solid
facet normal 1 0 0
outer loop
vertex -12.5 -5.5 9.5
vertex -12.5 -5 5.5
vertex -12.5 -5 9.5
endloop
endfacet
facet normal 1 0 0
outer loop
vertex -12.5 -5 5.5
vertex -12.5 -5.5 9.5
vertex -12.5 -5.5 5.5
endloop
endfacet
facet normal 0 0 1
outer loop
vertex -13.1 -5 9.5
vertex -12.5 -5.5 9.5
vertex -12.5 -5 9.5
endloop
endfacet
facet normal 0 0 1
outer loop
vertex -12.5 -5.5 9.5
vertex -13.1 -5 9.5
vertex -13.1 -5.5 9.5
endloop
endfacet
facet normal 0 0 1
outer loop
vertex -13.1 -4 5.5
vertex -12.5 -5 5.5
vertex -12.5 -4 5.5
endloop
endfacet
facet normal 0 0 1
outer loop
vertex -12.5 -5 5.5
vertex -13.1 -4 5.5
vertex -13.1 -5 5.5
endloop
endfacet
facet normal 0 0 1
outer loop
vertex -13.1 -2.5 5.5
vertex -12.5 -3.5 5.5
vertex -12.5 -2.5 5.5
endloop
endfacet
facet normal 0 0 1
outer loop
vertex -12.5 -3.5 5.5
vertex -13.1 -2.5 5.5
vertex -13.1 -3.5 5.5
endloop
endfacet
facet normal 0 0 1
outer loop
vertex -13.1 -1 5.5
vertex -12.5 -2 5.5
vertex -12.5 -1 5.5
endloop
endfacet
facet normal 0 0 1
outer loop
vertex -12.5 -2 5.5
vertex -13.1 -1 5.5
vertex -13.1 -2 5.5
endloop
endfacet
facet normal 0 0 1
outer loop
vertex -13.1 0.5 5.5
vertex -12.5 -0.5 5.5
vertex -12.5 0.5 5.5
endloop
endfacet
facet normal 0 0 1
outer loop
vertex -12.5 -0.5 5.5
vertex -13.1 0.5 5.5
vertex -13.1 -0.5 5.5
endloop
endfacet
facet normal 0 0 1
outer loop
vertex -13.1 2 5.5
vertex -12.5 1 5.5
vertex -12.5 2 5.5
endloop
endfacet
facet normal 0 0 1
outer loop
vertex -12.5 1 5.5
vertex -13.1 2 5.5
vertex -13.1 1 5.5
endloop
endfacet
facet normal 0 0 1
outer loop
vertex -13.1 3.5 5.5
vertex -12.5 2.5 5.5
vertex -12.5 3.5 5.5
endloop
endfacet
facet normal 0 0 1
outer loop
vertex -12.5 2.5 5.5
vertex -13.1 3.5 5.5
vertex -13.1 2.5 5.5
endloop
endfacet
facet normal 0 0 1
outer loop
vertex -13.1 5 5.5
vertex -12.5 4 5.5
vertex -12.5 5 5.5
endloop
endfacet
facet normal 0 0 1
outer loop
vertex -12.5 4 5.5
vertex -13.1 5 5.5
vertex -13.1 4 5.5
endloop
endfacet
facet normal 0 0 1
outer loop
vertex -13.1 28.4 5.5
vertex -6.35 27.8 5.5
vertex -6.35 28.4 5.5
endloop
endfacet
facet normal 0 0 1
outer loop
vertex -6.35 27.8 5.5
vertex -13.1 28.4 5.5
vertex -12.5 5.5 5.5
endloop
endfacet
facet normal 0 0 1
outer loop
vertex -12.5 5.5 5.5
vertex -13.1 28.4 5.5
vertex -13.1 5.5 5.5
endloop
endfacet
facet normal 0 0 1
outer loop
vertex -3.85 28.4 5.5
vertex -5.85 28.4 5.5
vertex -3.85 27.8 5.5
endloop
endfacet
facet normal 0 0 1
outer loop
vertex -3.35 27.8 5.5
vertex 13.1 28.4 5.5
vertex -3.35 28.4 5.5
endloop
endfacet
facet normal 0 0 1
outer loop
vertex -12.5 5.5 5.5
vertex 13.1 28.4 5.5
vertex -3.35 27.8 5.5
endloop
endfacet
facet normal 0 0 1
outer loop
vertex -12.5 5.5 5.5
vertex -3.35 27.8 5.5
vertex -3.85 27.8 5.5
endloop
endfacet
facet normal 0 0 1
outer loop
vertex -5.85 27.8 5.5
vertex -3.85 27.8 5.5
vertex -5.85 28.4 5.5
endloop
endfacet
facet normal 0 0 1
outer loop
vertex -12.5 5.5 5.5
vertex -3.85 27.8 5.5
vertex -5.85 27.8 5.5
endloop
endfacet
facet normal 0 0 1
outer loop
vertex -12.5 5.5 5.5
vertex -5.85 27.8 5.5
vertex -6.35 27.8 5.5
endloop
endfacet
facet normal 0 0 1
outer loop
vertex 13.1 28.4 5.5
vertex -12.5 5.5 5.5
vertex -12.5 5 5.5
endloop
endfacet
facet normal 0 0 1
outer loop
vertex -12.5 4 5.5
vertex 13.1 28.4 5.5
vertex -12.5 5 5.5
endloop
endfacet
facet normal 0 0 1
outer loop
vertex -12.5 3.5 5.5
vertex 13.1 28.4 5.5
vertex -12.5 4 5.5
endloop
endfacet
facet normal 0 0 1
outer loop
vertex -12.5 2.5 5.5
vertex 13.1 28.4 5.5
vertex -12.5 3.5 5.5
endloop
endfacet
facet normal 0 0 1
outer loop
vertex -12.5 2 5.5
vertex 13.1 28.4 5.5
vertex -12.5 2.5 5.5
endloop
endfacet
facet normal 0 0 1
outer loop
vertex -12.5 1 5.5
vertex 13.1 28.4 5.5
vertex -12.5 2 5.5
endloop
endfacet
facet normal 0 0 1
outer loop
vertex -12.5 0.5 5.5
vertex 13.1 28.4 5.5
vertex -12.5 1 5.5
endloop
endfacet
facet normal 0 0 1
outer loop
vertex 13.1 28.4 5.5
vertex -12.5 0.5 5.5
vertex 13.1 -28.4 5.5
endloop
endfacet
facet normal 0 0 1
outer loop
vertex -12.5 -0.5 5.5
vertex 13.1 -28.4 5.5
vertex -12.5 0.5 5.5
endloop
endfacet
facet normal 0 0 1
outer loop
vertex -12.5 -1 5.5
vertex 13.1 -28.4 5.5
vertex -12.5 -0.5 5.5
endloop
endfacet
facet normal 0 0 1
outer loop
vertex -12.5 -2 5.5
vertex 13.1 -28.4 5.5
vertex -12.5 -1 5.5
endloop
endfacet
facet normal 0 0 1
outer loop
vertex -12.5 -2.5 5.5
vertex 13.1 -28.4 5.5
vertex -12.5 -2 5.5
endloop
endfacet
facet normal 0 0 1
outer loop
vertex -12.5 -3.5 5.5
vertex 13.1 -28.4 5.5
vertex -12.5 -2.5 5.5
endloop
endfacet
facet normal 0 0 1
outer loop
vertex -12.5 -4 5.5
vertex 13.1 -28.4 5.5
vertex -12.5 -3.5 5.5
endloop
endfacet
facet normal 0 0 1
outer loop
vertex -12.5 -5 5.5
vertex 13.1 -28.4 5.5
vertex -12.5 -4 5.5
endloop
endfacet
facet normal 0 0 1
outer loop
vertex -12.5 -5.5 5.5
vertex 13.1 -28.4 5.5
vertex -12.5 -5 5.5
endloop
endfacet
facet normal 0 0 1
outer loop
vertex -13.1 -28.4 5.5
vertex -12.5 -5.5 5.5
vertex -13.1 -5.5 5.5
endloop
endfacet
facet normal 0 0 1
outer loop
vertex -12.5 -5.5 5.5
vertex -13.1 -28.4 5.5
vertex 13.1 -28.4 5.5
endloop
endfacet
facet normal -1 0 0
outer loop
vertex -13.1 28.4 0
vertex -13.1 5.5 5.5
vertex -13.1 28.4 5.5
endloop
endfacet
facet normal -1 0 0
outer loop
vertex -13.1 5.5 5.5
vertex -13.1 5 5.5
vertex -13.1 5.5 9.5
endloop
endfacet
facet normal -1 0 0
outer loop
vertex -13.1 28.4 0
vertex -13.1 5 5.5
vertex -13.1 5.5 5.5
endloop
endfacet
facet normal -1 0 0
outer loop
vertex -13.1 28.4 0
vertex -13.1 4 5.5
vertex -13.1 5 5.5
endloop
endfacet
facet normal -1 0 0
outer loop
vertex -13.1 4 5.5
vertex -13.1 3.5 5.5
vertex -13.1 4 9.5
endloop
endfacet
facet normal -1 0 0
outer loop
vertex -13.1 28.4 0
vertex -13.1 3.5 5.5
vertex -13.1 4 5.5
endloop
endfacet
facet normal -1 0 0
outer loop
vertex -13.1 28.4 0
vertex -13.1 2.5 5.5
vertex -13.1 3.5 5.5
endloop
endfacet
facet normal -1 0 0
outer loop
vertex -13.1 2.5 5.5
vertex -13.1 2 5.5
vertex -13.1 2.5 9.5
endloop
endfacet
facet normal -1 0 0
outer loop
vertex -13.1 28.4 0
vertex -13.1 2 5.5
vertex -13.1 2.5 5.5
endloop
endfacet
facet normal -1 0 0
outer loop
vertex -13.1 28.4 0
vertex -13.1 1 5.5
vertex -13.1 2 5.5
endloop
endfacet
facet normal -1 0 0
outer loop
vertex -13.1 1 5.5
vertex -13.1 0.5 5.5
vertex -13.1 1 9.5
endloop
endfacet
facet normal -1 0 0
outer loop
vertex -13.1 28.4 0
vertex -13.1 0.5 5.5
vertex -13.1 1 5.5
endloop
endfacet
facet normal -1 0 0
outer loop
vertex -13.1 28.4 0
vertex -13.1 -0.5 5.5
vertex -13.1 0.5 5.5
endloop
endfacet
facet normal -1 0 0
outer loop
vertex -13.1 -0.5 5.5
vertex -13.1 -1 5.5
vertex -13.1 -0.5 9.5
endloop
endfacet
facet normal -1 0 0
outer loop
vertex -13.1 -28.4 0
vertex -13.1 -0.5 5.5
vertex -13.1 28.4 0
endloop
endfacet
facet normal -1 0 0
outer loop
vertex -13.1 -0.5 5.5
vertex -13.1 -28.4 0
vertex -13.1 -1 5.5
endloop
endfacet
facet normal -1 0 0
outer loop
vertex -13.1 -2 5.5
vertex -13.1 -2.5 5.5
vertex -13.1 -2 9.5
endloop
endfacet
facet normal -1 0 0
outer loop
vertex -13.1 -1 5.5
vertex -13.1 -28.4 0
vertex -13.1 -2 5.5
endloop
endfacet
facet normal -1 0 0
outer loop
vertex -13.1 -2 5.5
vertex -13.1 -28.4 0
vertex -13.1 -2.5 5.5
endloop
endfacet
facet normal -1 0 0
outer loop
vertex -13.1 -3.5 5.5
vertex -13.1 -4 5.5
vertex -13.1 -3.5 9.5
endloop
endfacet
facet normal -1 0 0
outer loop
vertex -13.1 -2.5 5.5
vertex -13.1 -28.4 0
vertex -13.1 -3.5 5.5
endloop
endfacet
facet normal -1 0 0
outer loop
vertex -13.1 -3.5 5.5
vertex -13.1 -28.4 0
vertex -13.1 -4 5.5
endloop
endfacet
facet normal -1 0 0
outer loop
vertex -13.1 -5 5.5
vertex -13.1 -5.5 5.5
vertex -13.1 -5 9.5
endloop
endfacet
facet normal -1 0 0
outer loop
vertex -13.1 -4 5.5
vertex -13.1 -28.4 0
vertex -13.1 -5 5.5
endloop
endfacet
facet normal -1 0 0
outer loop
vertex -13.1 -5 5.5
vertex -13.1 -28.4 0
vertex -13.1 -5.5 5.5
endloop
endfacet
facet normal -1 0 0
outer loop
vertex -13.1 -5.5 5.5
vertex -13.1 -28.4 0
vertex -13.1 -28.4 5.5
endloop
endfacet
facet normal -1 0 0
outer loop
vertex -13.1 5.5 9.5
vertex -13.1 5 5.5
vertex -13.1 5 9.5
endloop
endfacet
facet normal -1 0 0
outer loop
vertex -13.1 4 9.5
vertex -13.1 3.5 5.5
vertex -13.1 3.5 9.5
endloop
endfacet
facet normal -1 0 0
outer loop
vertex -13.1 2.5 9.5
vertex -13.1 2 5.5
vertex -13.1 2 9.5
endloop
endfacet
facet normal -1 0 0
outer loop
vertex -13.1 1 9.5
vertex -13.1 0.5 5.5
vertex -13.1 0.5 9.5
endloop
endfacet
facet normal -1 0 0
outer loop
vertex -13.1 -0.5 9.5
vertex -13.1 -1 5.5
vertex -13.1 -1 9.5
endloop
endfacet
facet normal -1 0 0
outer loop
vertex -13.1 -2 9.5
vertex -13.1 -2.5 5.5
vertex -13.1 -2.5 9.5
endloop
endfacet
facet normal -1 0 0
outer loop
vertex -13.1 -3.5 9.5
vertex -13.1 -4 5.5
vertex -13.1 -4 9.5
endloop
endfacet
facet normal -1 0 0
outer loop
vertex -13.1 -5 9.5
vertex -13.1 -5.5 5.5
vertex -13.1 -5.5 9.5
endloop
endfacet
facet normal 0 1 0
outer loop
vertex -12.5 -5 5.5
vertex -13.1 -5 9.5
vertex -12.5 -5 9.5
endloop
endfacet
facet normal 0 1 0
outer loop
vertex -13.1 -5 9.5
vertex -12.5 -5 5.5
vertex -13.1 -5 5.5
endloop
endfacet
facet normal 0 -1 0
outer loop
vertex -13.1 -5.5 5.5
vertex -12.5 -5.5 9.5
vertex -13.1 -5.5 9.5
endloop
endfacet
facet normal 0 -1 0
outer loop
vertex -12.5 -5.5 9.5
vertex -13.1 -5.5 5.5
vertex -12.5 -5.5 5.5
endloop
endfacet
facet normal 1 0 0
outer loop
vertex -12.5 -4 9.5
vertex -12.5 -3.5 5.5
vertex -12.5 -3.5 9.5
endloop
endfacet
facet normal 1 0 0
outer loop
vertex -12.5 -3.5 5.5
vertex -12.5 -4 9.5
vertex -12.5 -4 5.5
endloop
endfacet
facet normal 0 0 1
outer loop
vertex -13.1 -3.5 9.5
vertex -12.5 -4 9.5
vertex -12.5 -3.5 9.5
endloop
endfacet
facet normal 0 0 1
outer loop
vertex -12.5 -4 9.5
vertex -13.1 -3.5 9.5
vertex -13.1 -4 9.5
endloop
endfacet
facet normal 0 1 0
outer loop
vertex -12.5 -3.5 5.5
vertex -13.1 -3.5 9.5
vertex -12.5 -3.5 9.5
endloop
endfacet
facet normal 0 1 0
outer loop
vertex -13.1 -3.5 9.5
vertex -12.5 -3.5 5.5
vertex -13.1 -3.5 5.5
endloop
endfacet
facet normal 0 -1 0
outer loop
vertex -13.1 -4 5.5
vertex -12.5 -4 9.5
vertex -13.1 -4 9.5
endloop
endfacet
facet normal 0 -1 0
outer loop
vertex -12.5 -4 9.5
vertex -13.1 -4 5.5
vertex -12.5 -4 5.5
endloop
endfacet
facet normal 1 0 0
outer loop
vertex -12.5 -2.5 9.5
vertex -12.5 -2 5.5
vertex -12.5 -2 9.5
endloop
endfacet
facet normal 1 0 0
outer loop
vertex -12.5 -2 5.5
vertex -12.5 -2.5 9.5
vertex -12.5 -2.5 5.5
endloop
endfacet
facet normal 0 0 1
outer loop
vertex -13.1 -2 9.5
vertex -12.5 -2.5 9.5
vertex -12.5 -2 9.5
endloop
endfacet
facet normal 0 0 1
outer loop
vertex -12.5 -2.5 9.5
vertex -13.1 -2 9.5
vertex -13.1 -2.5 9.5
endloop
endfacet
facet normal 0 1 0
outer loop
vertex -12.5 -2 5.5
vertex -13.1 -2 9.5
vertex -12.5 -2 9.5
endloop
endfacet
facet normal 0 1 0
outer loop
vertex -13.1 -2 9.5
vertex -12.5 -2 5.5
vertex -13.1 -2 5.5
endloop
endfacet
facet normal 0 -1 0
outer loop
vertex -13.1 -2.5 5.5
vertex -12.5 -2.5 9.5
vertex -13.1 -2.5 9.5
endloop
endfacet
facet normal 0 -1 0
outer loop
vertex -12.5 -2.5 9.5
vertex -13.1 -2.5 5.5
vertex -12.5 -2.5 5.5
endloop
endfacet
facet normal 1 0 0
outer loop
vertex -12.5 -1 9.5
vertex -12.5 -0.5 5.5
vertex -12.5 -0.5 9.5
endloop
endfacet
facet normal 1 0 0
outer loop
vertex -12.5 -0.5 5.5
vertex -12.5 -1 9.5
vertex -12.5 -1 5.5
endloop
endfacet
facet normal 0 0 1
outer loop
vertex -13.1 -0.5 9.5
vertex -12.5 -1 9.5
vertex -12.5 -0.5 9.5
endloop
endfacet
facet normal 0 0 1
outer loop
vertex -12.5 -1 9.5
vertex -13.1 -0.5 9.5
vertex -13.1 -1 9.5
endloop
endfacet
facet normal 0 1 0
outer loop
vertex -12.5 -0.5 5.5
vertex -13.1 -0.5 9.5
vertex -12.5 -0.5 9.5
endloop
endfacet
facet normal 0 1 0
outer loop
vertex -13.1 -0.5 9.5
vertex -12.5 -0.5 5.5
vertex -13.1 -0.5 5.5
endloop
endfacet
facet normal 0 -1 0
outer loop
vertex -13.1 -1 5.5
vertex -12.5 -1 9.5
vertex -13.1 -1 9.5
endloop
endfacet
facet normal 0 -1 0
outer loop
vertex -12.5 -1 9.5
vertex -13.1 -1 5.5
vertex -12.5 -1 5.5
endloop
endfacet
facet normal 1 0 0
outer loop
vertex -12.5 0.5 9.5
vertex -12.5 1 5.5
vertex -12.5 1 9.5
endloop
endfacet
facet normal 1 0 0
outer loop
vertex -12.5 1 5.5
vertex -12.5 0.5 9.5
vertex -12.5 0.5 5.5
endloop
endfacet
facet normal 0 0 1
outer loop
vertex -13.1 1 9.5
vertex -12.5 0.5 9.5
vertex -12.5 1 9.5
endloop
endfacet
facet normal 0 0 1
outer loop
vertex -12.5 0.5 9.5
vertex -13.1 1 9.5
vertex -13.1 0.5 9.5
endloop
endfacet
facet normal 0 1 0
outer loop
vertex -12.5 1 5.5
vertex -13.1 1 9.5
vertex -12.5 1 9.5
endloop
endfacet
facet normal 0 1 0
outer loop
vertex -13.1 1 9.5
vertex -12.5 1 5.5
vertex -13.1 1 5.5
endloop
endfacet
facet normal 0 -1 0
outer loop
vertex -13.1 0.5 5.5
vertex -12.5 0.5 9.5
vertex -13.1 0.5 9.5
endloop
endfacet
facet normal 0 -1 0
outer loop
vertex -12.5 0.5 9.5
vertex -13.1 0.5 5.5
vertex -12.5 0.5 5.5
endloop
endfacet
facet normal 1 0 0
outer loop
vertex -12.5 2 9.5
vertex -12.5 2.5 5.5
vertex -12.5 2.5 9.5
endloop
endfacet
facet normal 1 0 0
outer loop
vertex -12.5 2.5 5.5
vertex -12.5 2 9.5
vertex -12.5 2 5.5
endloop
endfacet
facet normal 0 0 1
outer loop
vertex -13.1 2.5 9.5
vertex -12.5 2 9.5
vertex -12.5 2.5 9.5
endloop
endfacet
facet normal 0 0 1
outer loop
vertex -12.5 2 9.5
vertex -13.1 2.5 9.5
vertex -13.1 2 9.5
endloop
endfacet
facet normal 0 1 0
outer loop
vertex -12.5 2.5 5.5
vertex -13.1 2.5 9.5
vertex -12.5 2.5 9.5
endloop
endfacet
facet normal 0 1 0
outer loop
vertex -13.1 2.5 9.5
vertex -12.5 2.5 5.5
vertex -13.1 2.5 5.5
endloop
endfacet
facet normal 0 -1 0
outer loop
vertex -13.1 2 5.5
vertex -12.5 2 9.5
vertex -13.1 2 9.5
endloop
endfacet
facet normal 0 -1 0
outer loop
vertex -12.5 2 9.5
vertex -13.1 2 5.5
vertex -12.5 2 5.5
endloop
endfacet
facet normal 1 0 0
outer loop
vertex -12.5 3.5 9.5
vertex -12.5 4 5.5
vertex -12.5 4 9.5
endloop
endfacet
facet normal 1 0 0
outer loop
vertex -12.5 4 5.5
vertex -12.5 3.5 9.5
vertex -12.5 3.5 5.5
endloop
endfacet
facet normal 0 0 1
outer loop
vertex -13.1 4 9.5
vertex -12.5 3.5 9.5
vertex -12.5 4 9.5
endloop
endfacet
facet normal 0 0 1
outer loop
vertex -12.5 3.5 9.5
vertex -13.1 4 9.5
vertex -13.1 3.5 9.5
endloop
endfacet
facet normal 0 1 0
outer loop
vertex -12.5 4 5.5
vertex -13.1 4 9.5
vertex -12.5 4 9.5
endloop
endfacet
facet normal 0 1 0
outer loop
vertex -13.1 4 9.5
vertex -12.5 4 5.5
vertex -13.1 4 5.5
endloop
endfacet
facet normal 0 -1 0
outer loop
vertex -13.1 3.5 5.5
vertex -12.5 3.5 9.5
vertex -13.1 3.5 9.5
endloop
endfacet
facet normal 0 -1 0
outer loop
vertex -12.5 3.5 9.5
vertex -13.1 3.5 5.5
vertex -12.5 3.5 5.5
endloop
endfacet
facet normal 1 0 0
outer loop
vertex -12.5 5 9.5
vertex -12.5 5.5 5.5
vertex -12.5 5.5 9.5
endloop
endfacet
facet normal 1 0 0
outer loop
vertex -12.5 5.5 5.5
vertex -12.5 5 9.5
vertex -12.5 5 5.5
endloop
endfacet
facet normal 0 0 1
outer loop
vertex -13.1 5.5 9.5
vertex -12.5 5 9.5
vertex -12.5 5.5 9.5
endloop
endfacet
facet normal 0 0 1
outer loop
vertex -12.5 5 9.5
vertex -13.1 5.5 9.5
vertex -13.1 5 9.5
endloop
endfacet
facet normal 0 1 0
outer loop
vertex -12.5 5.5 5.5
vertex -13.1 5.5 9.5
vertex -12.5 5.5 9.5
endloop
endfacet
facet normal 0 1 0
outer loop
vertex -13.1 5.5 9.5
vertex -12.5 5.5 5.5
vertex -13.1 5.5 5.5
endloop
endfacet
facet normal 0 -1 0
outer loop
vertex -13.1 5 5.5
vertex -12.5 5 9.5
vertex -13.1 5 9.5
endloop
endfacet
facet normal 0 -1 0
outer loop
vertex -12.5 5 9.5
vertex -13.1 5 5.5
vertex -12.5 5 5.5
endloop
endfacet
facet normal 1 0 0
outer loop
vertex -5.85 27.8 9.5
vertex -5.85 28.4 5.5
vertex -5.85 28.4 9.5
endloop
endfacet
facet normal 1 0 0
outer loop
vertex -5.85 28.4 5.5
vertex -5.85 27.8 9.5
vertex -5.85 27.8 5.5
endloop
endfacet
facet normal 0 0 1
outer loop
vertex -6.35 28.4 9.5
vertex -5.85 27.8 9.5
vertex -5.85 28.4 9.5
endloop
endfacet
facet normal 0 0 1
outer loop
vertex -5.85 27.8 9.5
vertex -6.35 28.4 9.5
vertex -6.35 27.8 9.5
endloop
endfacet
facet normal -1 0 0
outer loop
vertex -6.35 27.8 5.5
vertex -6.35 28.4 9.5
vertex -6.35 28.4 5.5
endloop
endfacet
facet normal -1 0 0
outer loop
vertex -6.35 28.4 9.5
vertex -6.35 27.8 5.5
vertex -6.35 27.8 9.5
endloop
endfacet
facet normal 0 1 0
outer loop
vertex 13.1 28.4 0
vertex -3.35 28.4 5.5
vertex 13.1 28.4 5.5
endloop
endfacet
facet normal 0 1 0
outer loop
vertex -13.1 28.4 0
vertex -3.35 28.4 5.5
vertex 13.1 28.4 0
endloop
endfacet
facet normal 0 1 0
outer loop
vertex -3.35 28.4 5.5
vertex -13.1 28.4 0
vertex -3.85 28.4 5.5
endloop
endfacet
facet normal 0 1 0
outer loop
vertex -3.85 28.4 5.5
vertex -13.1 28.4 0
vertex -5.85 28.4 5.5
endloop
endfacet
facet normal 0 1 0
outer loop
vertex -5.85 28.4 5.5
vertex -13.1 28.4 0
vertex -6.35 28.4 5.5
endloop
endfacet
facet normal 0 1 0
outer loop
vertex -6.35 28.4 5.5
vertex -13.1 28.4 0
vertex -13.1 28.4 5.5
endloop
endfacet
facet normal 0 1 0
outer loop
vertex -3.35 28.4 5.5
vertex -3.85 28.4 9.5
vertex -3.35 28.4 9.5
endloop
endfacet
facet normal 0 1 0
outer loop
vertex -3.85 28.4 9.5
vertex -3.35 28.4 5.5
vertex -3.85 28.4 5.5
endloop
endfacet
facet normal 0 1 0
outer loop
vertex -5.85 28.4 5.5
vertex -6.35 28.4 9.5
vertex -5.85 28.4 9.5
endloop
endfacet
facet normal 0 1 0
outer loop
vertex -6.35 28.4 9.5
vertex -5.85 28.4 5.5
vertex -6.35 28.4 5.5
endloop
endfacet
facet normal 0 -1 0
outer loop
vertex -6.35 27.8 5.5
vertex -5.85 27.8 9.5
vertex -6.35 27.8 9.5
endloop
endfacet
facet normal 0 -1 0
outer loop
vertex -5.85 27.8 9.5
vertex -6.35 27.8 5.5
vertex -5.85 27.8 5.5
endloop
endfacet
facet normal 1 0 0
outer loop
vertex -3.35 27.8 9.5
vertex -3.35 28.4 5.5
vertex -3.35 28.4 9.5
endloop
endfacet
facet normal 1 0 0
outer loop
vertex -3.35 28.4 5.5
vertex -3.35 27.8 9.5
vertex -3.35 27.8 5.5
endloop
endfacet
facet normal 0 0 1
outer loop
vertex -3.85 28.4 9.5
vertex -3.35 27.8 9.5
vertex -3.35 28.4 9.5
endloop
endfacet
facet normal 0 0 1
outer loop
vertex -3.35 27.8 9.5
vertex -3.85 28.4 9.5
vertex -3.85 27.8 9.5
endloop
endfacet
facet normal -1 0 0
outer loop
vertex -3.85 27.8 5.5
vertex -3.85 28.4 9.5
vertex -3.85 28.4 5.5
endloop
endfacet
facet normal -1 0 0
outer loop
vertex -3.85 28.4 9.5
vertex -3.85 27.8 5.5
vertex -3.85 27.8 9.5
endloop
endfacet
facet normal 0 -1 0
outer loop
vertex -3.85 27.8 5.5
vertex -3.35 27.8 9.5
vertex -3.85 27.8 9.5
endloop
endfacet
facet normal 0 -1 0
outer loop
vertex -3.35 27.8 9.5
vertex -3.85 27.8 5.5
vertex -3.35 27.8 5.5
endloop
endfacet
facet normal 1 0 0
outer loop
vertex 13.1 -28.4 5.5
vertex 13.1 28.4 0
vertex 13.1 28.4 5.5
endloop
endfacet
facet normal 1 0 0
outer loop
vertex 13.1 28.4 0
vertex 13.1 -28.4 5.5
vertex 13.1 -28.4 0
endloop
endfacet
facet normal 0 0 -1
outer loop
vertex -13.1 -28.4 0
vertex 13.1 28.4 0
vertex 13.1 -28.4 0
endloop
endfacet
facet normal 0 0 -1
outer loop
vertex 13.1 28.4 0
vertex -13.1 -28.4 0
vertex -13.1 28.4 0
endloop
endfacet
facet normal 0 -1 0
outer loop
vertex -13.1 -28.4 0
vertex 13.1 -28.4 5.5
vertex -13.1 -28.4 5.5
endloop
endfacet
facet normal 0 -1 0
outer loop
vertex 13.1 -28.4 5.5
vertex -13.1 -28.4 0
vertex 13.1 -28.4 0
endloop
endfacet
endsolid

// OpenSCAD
// Mechanical keep-out for NHD-C0216CiZ-FSW-FBW-3V3 (2x16 COG, I2C).
// Reference model only; do not print. X=short side, Y=long side, Z=rear depth.
//
// 2026-08-28: rebuilt from the datasheet mechanical drawing (rev 1B):
//   body 56.8 x 26.2 x 5.5 (backlight included)
//   8 signal pins on ONE LONG EDGE (bottom edge of the drawing), pitch 1.5,
//   centred, protruding 8.0 IN THE MODULE PLANE (not rearward).
//   backlight K/A: 2 pins, 2.5 apart, at one short end (right edge of the drawing).
// In the AquaBeacon door the pins are bent 90 deg rearward at the edge and
// trimmed to pin_bent so they clear the fixed C-frame (child_lcd_hinge_frame)
// and the rear clamp bars. The old 20x50 "carrier PCB" envelope is gone:
// the charge-pump caps (VOUT/C1+/C1-) go on a small cap board on the harness.

lcd_w = 26.2;      // X, short side. Signal pins are on the -X edge.
lcd_l = 56.8;      // Y, long side
lcd_h = 5.5;       // Z, rear depth (front face z=0)
pin_n = 8;
pin_pitch = 1.5;
pin_w = 0.5;
pin_bent = 4.0;    // length after bending rearward and trimming (datasheet 8.0 straight)
bl_pin_gap = 2.5;  // K/A spacing
bl_x = -lcd_w/2 + 7.0;   // K/A position along the short side (drawing: 7.00 from the pin edge)
$fn = 24;

union() {
    translate([-lcd_w/2, -lcd_l/2, 0]) cube([lcd_w, lcd_l, lcd_h]);
    // 8 signal pins, bent rearward along the -X edge
    for (i = [0:pin_n-1])
        translate([-lcd_w/2, (i - (pin_n-1)/2) * pin_pitch - pin_w/2, lcd_h])
            cube([pin_w + 0.1, pin_w, pin_bent]);
    // backlight K/A, bent rearward along the +Y short end
    for (k = [0, 1])
        translate([bl_x + k*bl_pin_gap - pin_w/2, lcd_l/2 - pin_w - 0.1, lcd_h])
            cube([pin_w, pin_w + 0.1, pin_bent]);
}

echo(str("nhd_c0216ciz: ", lcd_w, " x ", lcd_l, " x ", lcd_h, " pins on -X long edge, bent rearward ", pin_bent));
